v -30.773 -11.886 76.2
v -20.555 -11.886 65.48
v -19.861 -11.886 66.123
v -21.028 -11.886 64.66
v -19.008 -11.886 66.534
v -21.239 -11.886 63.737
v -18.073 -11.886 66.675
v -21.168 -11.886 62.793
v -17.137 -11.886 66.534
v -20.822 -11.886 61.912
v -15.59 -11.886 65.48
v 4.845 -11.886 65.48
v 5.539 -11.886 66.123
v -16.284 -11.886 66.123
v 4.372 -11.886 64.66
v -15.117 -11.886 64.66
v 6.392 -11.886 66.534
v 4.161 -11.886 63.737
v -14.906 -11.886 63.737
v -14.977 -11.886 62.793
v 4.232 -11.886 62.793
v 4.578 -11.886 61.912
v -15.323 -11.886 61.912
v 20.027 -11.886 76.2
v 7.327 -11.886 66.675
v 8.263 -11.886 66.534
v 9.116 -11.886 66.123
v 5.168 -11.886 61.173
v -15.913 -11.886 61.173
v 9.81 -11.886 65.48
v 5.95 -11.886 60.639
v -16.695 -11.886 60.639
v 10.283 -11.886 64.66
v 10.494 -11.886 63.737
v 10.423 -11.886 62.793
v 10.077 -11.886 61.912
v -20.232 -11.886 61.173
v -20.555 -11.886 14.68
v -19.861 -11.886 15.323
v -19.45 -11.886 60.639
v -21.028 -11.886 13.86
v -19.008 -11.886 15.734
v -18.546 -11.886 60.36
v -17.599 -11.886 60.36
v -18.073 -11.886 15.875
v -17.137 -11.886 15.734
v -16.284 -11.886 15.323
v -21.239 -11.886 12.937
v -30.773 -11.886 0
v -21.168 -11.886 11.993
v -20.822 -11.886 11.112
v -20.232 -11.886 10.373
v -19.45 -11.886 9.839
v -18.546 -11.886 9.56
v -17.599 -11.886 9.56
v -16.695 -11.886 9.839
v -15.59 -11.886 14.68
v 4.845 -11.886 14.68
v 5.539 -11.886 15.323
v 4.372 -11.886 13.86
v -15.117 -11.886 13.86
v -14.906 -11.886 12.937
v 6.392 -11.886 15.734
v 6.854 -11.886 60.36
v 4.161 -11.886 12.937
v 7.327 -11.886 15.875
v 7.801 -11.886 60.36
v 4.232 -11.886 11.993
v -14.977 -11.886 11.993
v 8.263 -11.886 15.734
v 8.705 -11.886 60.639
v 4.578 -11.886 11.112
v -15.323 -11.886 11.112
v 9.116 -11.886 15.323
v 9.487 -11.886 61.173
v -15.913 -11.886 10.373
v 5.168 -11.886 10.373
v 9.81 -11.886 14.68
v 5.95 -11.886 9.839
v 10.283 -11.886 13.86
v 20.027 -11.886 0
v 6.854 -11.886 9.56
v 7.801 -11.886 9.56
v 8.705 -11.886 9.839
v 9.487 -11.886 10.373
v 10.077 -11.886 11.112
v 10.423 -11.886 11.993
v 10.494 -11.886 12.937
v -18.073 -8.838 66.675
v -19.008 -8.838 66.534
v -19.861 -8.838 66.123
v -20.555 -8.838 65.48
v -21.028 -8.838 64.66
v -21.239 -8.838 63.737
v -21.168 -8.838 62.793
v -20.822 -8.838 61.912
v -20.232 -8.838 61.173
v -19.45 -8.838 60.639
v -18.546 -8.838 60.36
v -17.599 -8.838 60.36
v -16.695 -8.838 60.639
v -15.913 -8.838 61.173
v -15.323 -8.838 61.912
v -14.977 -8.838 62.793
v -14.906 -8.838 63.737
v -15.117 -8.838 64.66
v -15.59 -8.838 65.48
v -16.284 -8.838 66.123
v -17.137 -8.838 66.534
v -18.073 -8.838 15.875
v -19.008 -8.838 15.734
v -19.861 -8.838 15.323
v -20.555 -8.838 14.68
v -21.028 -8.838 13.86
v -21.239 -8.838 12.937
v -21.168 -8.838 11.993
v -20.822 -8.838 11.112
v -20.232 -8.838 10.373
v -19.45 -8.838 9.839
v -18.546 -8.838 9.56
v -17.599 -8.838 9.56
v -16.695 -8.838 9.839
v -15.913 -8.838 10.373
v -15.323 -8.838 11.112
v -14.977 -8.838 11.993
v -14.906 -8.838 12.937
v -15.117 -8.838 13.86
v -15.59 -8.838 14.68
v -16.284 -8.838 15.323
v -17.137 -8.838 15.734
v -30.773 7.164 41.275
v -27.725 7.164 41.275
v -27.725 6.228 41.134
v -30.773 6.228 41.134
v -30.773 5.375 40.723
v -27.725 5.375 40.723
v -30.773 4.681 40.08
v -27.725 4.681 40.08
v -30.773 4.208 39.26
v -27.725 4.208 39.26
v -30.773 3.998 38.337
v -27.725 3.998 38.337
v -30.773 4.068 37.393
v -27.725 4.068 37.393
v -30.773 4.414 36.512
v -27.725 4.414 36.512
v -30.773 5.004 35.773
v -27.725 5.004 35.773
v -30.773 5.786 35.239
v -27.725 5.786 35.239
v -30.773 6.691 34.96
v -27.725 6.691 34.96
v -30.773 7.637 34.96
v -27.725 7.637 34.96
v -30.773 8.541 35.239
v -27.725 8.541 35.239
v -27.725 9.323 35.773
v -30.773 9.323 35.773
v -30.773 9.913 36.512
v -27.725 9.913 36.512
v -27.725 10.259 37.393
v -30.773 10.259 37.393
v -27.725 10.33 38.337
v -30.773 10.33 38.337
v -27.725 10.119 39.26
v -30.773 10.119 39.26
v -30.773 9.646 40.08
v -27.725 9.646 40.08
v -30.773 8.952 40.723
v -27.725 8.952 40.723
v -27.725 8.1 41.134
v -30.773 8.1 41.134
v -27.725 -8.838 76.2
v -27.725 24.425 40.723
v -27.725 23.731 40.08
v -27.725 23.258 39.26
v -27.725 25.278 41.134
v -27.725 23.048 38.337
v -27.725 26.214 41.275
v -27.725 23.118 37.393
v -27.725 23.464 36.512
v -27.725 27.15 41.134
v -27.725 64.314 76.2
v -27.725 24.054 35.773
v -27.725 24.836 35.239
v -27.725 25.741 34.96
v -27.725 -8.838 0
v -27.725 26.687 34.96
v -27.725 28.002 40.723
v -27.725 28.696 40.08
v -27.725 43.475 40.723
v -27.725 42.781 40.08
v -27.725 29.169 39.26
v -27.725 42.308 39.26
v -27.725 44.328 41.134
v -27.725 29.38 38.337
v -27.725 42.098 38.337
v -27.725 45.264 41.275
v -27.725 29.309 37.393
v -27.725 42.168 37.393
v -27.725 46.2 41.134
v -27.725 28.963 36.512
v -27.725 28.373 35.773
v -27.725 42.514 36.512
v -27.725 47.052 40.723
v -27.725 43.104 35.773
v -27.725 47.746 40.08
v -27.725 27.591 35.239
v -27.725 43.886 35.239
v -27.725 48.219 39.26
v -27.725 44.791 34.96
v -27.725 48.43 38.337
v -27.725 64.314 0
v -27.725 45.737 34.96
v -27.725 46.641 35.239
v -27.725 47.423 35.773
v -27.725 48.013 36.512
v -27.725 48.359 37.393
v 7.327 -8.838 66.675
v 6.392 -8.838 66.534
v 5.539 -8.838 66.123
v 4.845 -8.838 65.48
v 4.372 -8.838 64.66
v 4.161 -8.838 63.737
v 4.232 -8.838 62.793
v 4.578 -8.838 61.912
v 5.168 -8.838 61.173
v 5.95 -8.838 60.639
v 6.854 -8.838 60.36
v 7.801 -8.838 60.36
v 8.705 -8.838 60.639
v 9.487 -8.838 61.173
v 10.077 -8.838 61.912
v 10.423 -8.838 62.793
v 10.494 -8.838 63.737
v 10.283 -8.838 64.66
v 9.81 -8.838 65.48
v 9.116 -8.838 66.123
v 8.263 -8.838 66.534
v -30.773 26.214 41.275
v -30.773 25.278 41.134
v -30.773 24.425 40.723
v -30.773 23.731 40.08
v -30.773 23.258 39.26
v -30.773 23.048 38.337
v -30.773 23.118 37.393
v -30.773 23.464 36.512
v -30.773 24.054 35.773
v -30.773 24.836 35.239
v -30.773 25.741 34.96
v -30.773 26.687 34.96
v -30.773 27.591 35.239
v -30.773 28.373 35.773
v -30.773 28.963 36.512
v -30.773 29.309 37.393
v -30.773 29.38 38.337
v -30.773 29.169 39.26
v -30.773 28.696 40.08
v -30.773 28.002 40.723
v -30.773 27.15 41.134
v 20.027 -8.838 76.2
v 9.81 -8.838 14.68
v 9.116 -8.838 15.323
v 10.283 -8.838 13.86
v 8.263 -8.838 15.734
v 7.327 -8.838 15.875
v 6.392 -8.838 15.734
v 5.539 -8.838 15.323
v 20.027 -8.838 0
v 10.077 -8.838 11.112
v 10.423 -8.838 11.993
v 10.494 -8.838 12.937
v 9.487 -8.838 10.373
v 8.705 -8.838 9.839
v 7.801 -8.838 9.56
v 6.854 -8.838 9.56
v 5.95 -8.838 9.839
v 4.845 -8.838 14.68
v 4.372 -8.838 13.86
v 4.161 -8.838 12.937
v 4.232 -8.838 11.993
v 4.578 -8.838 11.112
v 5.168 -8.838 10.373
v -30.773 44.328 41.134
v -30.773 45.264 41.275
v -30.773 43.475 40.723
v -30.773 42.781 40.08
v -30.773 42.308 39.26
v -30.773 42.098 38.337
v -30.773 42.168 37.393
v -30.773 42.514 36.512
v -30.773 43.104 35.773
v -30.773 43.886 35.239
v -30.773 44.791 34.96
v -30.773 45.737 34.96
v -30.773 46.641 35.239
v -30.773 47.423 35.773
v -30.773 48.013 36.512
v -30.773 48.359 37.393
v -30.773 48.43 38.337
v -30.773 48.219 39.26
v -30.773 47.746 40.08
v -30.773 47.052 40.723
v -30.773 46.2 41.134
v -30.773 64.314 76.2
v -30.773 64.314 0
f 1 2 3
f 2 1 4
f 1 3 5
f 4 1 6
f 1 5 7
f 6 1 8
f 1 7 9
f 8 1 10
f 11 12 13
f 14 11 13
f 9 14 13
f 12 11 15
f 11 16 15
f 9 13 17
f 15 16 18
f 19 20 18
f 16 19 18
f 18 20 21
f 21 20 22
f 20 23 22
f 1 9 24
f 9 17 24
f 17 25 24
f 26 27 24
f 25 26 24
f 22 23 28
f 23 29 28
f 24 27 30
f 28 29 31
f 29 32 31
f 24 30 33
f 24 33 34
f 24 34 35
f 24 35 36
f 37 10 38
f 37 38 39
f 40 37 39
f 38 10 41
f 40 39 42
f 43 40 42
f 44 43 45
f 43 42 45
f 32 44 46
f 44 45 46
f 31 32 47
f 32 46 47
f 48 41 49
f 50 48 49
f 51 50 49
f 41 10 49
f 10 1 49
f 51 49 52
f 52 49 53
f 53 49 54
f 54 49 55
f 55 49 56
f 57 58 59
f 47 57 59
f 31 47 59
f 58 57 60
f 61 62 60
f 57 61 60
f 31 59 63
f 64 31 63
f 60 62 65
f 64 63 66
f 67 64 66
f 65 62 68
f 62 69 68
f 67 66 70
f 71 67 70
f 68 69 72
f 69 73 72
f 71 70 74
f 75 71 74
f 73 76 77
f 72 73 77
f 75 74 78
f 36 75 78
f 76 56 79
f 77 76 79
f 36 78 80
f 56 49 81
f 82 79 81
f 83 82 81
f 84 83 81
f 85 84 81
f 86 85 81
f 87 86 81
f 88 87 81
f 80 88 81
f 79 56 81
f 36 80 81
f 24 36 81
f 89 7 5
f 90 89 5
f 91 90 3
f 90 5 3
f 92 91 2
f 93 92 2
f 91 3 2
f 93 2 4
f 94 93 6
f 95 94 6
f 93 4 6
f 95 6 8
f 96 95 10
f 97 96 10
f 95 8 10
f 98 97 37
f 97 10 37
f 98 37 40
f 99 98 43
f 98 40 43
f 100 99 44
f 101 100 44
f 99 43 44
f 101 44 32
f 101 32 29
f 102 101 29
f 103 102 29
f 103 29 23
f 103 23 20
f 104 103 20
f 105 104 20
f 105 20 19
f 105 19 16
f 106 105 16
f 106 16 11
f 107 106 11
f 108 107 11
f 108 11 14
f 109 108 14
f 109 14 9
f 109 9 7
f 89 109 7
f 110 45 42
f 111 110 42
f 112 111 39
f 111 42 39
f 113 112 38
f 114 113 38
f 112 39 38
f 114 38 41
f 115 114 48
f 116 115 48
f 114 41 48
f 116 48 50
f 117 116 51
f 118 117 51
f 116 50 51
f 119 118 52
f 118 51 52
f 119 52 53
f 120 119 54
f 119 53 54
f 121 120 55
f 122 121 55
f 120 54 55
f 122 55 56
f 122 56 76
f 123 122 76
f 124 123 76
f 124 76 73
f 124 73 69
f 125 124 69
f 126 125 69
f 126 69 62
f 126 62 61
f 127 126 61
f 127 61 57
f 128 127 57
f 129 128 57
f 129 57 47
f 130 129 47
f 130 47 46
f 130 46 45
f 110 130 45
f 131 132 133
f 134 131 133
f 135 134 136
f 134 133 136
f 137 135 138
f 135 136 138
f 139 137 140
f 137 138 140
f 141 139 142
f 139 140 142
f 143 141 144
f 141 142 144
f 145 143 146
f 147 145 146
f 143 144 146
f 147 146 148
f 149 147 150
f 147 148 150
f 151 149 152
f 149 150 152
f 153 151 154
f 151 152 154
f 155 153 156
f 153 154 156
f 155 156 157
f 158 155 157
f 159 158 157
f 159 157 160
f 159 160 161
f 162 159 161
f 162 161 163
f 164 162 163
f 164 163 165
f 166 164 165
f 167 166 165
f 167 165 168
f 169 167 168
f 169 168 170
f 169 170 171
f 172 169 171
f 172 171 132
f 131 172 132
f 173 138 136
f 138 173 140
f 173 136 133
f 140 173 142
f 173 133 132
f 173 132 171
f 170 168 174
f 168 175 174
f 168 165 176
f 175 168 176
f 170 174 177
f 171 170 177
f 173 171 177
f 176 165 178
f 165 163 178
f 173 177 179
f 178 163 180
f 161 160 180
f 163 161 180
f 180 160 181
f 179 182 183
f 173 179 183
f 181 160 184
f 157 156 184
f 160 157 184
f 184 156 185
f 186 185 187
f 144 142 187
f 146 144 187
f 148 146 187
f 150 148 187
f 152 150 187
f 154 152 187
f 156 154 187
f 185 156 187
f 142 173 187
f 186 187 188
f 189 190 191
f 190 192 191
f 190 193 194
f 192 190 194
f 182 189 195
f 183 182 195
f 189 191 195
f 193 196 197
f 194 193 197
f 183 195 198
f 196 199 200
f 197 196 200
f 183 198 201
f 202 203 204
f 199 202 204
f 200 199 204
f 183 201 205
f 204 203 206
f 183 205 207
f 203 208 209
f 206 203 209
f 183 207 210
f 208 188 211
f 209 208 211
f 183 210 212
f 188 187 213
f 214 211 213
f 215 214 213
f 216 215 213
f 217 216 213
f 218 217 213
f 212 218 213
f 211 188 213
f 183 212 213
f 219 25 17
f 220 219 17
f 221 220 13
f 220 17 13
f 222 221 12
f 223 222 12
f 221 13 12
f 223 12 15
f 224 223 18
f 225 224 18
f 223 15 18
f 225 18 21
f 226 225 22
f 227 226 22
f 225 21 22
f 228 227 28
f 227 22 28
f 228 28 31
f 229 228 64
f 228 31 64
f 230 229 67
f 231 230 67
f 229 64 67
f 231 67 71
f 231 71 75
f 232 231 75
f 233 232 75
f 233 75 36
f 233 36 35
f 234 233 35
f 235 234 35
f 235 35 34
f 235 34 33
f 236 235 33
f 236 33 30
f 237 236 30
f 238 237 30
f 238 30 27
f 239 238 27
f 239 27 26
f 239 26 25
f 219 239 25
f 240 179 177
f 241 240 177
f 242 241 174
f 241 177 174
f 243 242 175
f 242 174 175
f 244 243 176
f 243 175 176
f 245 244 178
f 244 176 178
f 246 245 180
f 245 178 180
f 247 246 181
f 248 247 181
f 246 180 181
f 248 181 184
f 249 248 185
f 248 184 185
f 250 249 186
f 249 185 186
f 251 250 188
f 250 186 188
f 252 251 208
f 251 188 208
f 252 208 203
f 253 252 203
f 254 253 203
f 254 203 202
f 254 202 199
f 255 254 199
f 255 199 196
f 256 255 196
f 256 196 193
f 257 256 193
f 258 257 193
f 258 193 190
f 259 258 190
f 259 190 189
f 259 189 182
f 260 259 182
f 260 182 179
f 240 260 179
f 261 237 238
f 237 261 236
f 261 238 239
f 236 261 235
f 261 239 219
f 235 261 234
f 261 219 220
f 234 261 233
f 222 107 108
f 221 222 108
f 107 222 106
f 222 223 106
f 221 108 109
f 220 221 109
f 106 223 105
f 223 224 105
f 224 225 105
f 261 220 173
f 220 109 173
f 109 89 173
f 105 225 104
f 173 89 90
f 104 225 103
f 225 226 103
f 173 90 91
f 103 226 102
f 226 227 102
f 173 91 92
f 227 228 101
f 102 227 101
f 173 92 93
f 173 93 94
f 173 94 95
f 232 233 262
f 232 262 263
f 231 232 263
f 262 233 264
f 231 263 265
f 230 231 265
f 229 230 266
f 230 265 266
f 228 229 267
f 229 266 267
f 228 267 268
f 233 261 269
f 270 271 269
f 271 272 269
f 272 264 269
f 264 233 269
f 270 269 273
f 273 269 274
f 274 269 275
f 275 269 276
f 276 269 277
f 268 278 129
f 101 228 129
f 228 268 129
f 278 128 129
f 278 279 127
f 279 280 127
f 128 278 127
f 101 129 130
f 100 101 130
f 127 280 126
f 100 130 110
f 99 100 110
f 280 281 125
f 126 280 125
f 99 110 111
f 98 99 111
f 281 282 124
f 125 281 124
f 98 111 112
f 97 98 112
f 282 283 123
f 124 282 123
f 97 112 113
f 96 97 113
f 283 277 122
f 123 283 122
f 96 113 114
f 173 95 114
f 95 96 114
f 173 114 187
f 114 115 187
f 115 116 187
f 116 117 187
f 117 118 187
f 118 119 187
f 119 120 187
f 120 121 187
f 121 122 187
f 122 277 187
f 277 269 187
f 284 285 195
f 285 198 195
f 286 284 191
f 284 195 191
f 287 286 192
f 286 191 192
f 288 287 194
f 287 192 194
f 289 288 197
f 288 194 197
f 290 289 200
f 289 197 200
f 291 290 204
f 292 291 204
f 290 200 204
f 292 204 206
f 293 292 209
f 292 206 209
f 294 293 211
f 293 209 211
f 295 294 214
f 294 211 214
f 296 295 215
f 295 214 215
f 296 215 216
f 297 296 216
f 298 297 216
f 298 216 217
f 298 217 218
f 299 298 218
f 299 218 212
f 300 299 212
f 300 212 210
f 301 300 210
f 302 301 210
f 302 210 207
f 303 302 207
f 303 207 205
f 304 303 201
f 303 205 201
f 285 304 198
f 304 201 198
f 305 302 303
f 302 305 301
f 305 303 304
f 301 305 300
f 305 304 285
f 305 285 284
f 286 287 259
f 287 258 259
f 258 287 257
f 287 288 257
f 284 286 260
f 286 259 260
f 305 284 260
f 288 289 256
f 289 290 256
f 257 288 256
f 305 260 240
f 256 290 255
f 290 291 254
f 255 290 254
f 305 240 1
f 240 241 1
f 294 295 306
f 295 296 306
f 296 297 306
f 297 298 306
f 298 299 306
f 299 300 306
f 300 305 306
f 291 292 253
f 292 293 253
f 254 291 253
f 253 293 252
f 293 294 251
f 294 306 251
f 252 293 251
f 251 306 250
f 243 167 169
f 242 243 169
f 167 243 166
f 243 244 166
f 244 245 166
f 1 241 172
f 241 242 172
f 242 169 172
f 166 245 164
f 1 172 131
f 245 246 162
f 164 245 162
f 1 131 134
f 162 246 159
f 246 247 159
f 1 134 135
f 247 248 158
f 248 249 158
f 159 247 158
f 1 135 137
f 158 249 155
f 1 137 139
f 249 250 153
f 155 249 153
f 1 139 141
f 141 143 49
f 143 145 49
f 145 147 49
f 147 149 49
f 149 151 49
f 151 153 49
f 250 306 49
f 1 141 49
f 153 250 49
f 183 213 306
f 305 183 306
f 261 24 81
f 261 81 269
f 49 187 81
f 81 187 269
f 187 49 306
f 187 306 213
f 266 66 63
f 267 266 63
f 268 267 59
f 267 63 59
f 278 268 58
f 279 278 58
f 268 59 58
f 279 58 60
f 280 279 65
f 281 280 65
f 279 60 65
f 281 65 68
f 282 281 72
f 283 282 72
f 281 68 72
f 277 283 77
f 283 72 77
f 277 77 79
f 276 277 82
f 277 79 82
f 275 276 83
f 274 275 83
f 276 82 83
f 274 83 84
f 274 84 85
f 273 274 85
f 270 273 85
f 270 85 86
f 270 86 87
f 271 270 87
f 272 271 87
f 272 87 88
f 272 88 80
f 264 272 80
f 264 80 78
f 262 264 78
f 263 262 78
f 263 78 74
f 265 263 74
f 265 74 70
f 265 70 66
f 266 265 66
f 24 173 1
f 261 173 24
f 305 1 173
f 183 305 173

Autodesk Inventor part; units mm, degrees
ref_plane "YZ Plane" through (0, 0, 0) normal (1, 0, 0) x (0, 1, 0)
ref_plane "XZ Plane" through (0, 0, 0) normal (0, 1, 0) x (-1, 0, 0)
ref_plane "XY Plane" through (0, 0, 0) normal (0, 0, 1) x (1, 0, 0)
sketch "Sketch1" plane through (0, 0, 0) normal (0, 0, 1) x (1, 0, 0)
  line L0 (-30.7726, 64.3138) -> (-30.7726, -11.8862)
  line L1 (-30.7726, -11.8862) -> (20.0274, -11.8862)
  line L2 (20.0274, -11.8862) -> (20.0274, -8.8382)
  line L3 (20.0274, -8.8382) -> (-27.7246, -8.8382)
  line L4 (-27.7246, -8.8382) -> (-27.7246, 64.3138)
  line L5 (-27.7246, 64.3138) -> (-30.7726, 64.3138)
  point P0 (0, 0)
  dimension "d0" = 3.048
  dimension "d1" = 3.048
  dimension "d2" = 76.2
  dimension "d3" = 50.8
extrude "Extrusion1" add sketch "Sketch1" along normal blind 76.2
sketch "Sketch2" plane through (-30.7726, -11.8862, 0) normal (-1, 0, 0) x (0, 0, 1)
  line L0 (0, 76.2) -> (0, 0) projected
  line L1 (0, 0) -> (76.2, 0) projected
  point P0 (0, 11.8862)
  point P1 (38.1, 57.15)
  point P2 (38.1, 38.1)
  point P3 (38.1, 19.05)
  dimension "d6" = 19.05
  dimension "d7" = 38.1
  dimension "d8" = 57.15
  dimension "d9" = 38.1
  dimension "d10" = 38.1
  dimension "d11" = 38.1
hole "Hole1" at (-30.7726, 45.2638, 38.1) at (-30.7726, 26.2138, 38.1) at (-30.7726, 7.1638, 38.1) direction (1, 0, 0) diameter 6.35 depth 25.4 tip angle 118
thread "Thread1" size "1/4-20 UNC" class "2B" standard "ANSI Unified Screw Threads" full length
thread "Thread2" size "1/4-20 UNC" class "2B" standard "ANSI Unified Screw Threads" full length
thread "Thread3" size "1/4-20 UNC" class "2B" standard "ANSI Unified Screw Threads" full length
sketch "Sketch3" plane through (-27.7246, -8.8382, 0) normal (0, 1, 0) x (1, 0, 0)
  line L0 (0, -76.2) -> (47.752, -76.2) projected
  line L1 (47.752, 0) -> (47.752, -76.2) projected
  line L2 (47.752, 0) -> (0, 0) projected
  point P0 (27.7246, 0)
  point P1 (9.652, -63.5)
  point P2 (9.652, -12.7)
  point P3 (35.052, -12.7)
  point P4 (35.052, -63.5)
  dimension "d30" = 12.7
  dimension "d31" = 12.7
  dimension "d32" = 12.7
  dimension "d33" = 12.7
  dimension "d34" = 12.7
  dimension "d35" = 38.1
  dimension "d36" = 12.7
  dimension "d37" = 38.1
hole "Hole2" at (-18.0726, -8.8382, 63.5) at (-18.0726, -8.8382, 12.7) at (7.3274, -8.8382, 12.7) at (7.3274, -8.8382, 63.5) direction (0, -1, 0) diameter 6.35 depth 25.4 tip angle 118
thread "Thread4" size "1/4-20 UNC" class "2B" standard "ANSI Unified Screw Threads" full length
thread "Thread5" size "1/4-20 UNC" class "2B" standard "ANSI Unified Screw Threads" full length
thread "Thread6" size "1/4-20 UNC" class "2B" standard "ANSI Unified Screw Threads" full length
thread "Thread7" size "1/4-20 UNC" class "2B" standard "ANSI Unified Screw Threads" full length
properties part number "curveBracket"
